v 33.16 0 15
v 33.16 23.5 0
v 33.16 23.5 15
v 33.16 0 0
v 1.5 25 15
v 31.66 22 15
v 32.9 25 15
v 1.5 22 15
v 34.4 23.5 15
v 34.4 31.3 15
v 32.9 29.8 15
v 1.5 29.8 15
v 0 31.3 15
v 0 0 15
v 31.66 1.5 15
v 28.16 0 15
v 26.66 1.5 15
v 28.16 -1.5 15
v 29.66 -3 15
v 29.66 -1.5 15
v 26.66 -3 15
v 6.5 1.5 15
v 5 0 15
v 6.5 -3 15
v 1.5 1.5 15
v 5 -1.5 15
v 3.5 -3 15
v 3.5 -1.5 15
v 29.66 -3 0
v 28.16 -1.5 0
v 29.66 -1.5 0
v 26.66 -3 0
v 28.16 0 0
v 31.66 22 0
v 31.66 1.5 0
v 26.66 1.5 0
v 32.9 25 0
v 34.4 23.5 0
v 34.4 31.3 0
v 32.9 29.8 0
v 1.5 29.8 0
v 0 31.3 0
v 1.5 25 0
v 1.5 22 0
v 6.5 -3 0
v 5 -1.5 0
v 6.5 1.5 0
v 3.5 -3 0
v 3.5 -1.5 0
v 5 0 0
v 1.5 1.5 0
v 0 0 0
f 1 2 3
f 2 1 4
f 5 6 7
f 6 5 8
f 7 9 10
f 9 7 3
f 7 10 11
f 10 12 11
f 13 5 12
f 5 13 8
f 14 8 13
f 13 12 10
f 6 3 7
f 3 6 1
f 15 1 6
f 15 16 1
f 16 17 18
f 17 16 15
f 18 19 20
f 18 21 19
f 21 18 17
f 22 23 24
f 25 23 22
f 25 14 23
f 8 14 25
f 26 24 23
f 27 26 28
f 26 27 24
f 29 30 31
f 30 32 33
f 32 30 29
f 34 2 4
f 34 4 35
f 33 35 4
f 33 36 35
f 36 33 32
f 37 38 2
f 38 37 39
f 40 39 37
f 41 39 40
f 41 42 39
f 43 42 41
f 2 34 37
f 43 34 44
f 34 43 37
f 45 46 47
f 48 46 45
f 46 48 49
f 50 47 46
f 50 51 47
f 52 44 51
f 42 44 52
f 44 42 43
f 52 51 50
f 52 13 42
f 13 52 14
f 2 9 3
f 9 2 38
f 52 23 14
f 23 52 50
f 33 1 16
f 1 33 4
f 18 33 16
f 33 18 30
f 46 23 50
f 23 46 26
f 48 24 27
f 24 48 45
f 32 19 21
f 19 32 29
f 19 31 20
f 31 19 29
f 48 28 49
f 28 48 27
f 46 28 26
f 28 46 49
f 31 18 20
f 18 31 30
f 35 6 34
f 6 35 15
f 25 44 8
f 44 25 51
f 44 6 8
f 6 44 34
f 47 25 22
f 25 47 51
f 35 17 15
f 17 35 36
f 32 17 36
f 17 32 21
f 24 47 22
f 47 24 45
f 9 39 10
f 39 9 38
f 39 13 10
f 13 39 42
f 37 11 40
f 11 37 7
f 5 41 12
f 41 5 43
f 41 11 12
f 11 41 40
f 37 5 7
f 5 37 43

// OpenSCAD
h = 15;
w = 30.16;
d = 20.5;
t = 1.5;

o = 5;

difference(){
    union(){
        cube([w + 2*t, d + 2*t, h]);
        translate([o, -2*t, 0])
        cube([w - 2*(o - t), 2*t, h]);
        translate([o - t, -2*t, 0])
        cube([w - 2*(o - 2*t), t, h]);
    }
    translate([t, t, 0])
    cube([w, d, h]);
    translate([t + o, -2*t, 0])
    cube([w - 2*o, t*3, h]);
}

esp = [31.4, 4.8, h];

translate([0, d + 2*t, 0])
difference(){
    cube([esp.x + 2*t, esp.y + 2*t, esp.z]);
    translate([t, t, 0])
    cube(esp);
}
